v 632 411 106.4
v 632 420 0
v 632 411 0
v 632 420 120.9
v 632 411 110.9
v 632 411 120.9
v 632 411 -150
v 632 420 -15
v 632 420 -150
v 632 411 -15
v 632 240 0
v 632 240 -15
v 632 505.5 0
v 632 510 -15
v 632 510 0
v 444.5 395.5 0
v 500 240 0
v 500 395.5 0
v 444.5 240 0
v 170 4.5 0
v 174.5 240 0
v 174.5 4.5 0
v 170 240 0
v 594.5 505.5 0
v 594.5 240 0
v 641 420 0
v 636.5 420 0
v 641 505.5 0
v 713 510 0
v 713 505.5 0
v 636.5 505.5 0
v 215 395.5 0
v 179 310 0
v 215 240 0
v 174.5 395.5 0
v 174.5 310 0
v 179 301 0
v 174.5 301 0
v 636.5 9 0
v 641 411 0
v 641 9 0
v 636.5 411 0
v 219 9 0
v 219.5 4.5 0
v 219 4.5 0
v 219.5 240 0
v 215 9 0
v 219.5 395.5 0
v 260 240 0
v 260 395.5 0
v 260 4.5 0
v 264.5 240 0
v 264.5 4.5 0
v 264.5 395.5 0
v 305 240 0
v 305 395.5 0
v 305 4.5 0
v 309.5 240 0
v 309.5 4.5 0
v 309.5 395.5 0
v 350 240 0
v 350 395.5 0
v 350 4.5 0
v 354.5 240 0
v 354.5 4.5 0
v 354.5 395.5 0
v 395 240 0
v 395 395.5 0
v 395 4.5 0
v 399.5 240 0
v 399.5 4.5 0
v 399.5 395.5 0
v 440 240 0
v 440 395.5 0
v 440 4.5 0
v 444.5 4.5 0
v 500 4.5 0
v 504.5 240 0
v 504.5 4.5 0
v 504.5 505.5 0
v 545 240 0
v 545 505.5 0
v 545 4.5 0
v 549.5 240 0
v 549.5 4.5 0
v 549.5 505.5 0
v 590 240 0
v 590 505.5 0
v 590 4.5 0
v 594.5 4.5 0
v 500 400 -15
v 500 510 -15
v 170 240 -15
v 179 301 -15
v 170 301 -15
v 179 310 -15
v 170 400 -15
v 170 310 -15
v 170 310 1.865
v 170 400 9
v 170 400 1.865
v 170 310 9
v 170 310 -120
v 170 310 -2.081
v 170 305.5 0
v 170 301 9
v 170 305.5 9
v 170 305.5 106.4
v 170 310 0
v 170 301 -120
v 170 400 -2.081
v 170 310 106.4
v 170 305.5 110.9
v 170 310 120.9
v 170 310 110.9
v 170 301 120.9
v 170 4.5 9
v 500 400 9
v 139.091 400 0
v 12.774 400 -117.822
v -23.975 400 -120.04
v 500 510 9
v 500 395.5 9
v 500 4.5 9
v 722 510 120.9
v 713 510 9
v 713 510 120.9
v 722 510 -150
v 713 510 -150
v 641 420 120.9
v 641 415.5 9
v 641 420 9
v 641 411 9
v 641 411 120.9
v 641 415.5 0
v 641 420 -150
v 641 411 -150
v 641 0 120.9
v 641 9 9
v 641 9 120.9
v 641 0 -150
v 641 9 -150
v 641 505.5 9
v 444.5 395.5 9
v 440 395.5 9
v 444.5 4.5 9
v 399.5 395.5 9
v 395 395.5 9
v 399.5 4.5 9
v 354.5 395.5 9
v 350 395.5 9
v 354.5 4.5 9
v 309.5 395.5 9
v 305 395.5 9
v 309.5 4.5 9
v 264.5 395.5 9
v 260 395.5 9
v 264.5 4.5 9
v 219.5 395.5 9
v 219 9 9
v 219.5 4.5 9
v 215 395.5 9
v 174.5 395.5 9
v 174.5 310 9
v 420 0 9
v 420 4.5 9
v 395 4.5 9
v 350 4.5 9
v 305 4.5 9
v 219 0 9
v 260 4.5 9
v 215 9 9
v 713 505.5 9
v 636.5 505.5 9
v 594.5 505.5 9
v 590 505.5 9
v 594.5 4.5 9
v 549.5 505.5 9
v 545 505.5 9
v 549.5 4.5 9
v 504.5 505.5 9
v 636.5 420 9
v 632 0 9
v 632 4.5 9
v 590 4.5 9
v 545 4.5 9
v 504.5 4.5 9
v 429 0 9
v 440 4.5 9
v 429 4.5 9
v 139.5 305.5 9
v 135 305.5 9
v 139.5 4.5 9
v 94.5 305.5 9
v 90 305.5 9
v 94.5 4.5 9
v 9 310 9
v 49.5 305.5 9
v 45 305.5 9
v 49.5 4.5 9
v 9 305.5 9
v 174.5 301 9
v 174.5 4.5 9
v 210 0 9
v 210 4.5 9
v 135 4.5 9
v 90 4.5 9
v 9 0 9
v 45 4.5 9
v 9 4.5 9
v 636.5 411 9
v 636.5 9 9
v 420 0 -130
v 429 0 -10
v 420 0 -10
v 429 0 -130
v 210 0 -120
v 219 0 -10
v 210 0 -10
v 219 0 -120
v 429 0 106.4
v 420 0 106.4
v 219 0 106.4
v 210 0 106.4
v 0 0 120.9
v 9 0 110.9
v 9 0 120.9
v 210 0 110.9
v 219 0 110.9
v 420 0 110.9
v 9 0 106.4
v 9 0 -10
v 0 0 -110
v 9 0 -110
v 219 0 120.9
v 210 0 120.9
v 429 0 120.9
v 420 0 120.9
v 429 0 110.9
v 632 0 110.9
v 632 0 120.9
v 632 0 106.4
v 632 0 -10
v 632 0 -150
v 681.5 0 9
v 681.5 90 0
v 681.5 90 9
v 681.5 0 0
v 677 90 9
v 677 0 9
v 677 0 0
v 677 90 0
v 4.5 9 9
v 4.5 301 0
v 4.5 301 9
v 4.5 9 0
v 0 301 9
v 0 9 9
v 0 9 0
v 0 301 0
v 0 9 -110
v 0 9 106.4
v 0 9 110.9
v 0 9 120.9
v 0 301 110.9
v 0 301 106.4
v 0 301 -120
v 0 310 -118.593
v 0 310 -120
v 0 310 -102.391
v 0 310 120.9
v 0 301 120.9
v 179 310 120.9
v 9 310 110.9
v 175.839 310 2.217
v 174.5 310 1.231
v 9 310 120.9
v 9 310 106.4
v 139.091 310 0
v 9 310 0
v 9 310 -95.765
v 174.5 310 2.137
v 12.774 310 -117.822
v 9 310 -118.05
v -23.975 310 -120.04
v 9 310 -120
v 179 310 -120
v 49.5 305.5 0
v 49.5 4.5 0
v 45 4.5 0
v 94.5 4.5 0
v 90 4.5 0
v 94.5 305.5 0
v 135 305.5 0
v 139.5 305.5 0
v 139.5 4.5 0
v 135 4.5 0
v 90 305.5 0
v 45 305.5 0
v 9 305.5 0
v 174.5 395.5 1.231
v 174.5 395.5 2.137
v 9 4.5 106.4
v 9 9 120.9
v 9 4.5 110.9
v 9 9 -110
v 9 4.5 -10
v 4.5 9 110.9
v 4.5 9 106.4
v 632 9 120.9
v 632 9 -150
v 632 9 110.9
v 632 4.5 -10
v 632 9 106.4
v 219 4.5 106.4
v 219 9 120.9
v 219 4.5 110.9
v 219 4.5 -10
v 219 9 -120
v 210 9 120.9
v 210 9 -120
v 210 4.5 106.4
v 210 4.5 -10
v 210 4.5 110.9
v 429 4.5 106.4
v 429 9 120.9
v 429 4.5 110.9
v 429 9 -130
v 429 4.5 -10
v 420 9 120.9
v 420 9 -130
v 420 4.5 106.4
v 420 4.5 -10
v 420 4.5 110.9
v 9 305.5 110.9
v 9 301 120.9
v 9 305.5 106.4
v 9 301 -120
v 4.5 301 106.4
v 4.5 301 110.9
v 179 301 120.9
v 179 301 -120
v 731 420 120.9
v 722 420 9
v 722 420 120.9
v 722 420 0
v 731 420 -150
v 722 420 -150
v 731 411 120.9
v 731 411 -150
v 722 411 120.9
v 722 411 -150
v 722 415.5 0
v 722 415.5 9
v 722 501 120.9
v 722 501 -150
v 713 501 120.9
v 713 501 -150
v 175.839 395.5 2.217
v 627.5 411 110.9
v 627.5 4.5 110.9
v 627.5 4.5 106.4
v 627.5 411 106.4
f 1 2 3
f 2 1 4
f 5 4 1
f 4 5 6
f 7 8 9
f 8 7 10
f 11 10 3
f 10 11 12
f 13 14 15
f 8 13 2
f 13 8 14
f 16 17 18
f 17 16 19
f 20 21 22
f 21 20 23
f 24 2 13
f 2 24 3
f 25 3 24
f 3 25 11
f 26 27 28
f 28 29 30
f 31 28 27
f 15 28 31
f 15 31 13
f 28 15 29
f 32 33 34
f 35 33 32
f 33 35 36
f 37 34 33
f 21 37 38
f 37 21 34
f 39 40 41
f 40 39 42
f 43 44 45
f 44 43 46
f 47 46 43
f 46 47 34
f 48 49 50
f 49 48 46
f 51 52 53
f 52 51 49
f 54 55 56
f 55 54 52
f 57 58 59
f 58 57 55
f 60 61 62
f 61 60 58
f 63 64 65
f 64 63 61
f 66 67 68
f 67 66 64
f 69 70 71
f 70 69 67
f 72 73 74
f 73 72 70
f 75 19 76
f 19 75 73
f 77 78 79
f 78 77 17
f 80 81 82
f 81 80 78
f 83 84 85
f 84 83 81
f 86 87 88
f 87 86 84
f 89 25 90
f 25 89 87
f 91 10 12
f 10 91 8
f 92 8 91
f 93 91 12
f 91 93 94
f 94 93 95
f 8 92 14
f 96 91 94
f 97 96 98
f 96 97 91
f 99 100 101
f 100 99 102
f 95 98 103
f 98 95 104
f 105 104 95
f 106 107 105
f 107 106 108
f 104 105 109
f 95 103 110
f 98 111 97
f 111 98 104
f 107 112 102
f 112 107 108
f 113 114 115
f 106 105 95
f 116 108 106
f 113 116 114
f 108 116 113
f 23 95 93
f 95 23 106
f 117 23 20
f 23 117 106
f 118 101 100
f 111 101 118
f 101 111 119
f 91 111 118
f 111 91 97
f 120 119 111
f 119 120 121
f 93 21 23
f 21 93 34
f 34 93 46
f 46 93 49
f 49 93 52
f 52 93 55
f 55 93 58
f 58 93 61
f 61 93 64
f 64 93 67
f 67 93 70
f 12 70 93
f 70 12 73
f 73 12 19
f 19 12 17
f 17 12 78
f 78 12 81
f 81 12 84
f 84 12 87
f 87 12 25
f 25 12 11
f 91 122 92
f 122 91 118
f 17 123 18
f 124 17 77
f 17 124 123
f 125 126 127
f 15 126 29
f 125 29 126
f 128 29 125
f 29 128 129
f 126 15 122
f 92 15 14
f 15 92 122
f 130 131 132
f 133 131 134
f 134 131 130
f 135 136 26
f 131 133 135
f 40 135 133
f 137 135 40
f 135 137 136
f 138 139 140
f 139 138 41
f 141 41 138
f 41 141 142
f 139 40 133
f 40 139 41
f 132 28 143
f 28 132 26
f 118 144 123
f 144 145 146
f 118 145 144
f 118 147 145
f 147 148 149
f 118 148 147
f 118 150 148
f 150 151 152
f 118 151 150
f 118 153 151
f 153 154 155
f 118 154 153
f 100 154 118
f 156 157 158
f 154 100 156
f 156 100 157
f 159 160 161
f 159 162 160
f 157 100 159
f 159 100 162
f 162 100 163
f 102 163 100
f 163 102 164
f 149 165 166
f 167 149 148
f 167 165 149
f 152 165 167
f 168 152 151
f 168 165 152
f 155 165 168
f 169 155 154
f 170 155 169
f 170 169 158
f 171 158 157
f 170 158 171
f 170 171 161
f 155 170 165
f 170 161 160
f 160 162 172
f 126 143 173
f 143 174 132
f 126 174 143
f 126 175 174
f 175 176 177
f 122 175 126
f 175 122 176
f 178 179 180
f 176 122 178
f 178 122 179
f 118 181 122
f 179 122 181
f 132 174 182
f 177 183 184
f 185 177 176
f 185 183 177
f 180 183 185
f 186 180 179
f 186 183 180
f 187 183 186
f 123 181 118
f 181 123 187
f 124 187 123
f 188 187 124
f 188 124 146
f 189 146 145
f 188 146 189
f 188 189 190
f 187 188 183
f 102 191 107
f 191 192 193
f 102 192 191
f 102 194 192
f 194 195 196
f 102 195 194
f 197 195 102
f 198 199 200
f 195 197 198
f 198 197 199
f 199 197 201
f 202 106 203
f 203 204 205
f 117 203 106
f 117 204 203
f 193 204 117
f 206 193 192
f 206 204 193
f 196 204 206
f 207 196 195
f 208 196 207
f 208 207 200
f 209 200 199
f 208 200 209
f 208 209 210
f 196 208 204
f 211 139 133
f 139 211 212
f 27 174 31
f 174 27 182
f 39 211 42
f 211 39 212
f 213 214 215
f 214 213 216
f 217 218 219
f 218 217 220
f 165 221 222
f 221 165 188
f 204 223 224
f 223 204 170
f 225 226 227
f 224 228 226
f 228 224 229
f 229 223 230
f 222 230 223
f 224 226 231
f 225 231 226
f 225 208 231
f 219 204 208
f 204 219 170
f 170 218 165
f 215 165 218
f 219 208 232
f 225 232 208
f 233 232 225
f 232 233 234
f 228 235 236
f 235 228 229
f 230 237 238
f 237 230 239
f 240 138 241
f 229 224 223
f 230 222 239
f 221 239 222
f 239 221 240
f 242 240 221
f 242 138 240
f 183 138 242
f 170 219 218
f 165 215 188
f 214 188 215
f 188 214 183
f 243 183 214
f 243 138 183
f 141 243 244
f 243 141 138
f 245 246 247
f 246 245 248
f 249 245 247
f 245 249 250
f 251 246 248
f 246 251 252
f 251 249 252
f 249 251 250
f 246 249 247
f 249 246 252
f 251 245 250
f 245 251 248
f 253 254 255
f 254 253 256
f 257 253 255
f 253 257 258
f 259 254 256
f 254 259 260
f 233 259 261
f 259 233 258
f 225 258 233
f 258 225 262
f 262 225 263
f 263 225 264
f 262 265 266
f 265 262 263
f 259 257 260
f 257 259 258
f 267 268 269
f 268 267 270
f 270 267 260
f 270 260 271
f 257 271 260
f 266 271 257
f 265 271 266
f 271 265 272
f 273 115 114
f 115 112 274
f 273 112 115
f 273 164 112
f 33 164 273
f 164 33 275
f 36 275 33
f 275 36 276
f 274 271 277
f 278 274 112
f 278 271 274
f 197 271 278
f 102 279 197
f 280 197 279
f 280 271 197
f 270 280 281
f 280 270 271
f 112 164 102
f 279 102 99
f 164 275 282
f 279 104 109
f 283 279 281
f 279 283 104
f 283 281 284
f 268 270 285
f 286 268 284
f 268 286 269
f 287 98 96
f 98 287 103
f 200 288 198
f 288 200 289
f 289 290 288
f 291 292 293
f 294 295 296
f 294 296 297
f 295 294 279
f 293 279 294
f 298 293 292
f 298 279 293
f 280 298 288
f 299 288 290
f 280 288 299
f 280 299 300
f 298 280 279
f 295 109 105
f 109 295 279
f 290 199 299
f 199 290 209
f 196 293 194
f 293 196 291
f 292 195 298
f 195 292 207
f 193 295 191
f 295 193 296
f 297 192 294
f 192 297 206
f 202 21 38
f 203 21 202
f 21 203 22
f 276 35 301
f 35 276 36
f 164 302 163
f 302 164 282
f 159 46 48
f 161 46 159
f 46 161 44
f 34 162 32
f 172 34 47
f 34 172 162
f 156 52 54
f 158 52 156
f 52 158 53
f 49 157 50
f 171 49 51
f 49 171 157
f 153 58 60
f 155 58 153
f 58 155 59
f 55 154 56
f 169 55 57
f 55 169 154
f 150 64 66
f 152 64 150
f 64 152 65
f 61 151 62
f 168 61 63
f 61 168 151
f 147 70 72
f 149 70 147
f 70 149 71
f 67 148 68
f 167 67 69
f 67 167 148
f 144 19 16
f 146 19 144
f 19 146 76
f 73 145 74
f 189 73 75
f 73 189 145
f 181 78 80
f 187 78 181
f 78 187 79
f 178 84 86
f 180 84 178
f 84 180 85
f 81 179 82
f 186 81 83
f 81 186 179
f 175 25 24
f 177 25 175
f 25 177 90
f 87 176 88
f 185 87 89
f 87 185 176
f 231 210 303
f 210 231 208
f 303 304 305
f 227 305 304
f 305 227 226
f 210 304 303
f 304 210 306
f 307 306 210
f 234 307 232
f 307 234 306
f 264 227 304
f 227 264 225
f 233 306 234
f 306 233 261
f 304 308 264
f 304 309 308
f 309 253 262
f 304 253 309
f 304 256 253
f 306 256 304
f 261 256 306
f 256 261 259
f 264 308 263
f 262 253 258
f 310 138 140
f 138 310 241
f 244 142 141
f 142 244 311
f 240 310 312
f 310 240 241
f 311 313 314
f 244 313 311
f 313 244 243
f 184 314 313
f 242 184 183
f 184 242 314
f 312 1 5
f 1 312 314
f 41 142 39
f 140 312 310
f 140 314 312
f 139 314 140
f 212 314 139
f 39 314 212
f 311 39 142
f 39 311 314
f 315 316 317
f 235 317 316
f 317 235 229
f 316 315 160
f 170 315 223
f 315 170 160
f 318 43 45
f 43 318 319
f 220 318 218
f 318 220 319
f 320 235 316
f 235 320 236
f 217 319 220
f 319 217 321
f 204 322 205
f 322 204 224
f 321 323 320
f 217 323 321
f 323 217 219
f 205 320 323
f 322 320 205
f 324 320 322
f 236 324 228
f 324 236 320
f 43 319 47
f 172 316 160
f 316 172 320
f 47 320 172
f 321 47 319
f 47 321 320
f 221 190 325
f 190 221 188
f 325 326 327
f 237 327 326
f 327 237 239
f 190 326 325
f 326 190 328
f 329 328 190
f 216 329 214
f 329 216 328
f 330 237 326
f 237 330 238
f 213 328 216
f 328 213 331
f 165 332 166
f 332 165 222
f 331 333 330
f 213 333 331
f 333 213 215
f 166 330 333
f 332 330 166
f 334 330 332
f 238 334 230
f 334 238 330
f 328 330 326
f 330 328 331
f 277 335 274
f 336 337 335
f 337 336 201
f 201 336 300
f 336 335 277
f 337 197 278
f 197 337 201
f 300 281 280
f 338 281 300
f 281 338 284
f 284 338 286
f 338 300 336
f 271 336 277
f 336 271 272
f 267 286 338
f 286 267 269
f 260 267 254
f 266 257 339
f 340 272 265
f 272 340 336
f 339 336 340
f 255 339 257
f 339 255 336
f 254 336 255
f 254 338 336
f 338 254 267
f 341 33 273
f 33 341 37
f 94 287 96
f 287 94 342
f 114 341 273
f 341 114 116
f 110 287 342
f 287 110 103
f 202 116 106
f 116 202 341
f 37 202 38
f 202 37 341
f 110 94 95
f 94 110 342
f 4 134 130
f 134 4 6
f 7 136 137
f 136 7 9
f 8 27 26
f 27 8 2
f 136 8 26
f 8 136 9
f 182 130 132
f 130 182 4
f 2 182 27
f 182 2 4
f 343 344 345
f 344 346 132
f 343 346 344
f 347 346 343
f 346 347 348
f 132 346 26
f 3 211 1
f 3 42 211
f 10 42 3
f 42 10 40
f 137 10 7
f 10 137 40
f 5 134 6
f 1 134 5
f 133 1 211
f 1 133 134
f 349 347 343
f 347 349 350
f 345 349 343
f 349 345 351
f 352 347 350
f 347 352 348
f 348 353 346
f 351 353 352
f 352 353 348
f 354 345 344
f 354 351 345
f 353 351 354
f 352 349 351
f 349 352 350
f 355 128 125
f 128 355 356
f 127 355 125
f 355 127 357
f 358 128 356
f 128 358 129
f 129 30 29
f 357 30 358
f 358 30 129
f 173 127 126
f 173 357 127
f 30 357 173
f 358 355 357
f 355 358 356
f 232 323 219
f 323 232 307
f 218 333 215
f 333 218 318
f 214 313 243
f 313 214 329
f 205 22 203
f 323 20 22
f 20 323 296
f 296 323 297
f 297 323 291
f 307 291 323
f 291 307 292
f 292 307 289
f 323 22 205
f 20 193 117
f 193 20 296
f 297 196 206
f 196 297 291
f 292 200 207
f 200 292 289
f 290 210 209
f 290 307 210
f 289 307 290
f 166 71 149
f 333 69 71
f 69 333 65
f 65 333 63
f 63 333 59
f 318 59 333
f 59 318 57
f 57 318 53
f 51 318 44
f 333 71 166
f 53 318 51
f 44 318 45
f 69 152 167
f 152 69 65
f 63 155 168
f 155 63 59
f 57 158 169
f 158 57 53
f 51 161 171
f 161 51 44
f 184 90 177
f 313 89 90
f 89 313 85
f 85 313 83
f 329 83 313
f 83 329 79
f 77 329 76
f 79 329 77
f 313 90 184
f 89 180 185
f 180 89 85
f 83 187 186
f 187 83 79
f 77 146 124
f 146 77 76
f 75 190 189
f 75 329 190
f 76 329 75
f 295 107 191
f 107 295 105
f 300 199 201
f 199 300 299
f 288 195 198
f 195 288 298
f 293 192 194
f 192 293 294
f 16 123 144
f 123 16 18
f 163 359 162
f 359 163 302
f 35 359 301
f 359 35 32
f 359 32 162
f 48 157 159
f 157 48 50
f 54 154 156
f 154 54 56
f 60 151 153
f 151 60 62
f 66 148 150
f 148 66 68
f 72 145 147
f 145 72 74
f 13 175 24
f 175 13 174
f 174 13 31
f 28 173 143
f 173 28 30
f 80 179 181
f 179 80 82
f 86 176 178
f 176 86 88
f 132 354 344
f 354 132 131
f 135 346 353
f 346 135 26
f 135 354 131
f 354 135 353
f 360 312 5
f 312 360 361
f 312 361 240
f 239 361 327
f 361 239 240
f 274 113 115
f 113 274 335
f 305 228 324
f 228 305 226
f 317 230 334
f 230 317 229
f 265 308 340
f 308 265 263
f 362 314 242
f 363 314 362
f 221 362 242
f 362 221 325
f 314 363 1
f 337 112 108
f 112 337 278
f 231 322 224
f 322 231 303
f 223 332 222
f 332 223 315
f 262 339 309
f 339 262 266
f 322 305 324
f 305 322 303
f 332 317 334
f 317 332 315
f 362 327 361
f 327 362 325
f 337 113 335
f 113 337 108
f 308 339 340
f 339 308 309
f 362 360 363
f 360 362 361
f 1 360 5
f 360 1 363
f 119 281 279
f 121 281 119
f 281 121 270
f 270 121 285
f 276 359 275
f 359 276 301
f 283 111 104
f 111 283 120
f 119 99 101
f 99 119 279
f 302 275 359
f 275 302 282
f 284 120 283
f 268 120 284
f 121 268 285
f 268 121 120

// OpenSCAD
union () {
  color ([4/5, 4/5, 4/5, 1]) {
    union () {
      translate ([170, 240, -15]) {
        cube ([462, 160, 15]);
      }
      translate ([500, 400, -15]) {
        cube ([132, 110, 15]);
      }
    }
  }
  color ([3/5, 113/255, 29/85, 1]) {
    translate ([0, 0, -110]) {
      cube ([9, 9, 230.9]);
    }
  }
  color ([3/5, 113/255, 29/85, 1]) {
    translate ([632, 0, -150]) {
      cube ([9, 9, 270.9]);
    }
  }
  color ([3/5, 113/255, 29/85, 1]) {
    translate ([210, 0, -120]) {
      cube ([9, 9, 240.9]);
    }
  }
  color ([3/5, 113/255, 29/85, 1]) {
    translate ([420, 0, -130]) {
      cube ([9, 9, 250.9]);
    }
  }
  color ([3/5, 113/255, 29/85, 1]) {
    translate ([0, 301, -120]) {
      cube ([9, 9, 240.9]);
    }
  }
  color ([3/5, 113/255, 29/85, 1]) {
    translate ([170, 301, -120]) {
      cube ([9, 9, 240.9]);
    }
  }
  color ([3/5, 113/255, 29/85, 1]) {
    translate ([632, 411, -150]) {
      cube ([9, 9, 270.9]);
    }
  }
  color ([3/5, 113/255, 29/85, 1]) {
    translate ([722, 411, -150]) {
      cube ([9, 9, 270.9]);
    }
  }
  color ([3/5, 113/255, 29/85, 1]) {
    translate ([713, 501, -150]) {
      cube ([9, 9, 270.9]);
    }
  }
  color ([3/5, 113/255, 29/85, 1]) {
    translate ([0, 0, -10]) {
      cube ([641, 4.5, 19]);
    }
  }
  color ([3/5, 113/255, 29/85, 1]) {
    translate ([0, 305.5, 0]) {
      cube ([170, 4.5, 9]);
    }
  }
  color ([3/5, 113/255, 29/85, 1]) {
    translate ([170, 395.5, 0]) {
      cube ([330, 4.5, 9]);
    }
  }
  color ([3/5, 113/255, 29/85, 1]) {
    translate ([500, 505.5, 0]) {
      cube ([222, 4.5, 9]);
    }
  }
  color ([3/5, 113/255, 29/85, 1]) {
    translate ([632, 415.5, 0]) {
      cube ([90, 4.5, 9]);
    }
  }
  color ([3/5, 113/255, 29/85, 1]) {
    translate ([0, 0, 106.4]) {
      cube ([632, 4.5, 4.5]);
    }
  }
  color ([3/5, 113/255, 29/85, 1]) {
    translate ([0, 305.5, 106.4]) {
      cube ([170, 4.5, 4.5]);
    }
  }
  color ([3/5, 113/255, 29/85, 1]) {
    translate ([0, 0, 106.4]) {
      cube ([4.5, 310, 4.5]);
    }
  }
  color ([3/5, 113/255, 29/85, 1]) {
    translate ([627.5, 0, 106.4]) {
      cube ([4.5, 411, 4.5]);
    }
  }
  translate ([139.0909090909091, 310, 0]) {
    rotate ([0.0,4463.641621428631,0.0]) {
      polyhedron (points=[[0, 0, 0], [202.48456731316588, 0, 0], [202.48456731316588, 90, 0], [0, 90, 0], [-30.909090909090907, 0, 20], [171.57547640407498, 0, 20], [171.57547640407498, 90, 20], [-30.909090909090907, 90, 20]], faces=[[0, 1, 2, 3], [4, 5, 1, 0], [7, 6, 5, 4], [5, 6, 2, 1], [6, 7, 3, 2], [7, 4, 0, 3]]);
    }
  }
  union () {
    color ([3/5, 113/255, 29/85, 1]) {
      translate ([636.5, 0, 0]) {
        cube ([4.5, 510, 9]);
      }
    }
    color ([3/5, 113/255, 29/85, 1]) {
      translate ([677, 0, 0]) {
        cube ([4.5, 90, 9]);
      }
    }
    color ([3/5, 113/255, 29/85, 1]) {
      translate ([0, 0, 0]) {
        cube ([4.5, 310, 9]);
      }
    }
    color ([3/5, 113/255, 29/85, 1]) {
      translate ([45, 0, 0]) {
        cube ([4.5, 310, 9]);
      }
    }
    color ([3/5, 113/255, 29/85, 1]) {
      translate ([90, 0, 0]) {
        cube ([4.5, 310, 9]);
      }
    }
    color ([3/5, 113/255, 29/85, 1]) {
      translate ([135, 0, 0]) {
        cube ([4.5, 310, 9]);
      }
    }
    color ([3/5, 113/255, 29/85, 1]) {
      translate ([170, 0, 0]) {
        cube ([4.5, 400, 9]);
      }
    }
    color ([3/5, 113/255, 29/85, 1]) {
      translate ([215, 0, 0]) {
        cube ([4.5, 400, 9]);
      }
    }
    color ([3/5, 113/255, 29/85, 1]) {
      translate ([260, 0, 0]) {
        cube ([4.5, 400, 9]);
      }
    }
    color ([3/5, 113/255, 29/85, 1]) {
      translate ([305, 0, 0]) {
        cube ([4.5, 400, 9]);
      }
    }
    color ([3/5, 113/255, 29/85, 1]) {
      translate ([350, 0, 0]) {
        cube ([4.5, 400, 9]);
      }
    }
    color ([3/5, 113/255, 29/85, 1]) {
      translate ([395, 0, 0]) {
        cube ([4.5, 400, 9]);
      }
    }
    color ([3/5, 113/255, 29/85, 1]) {
      translate ([440, 0, 0]) {
        cube ([4.5, 400, 9]);
      }
    }
    color ([3/5, 113/255, 29/85, 1]) {
      translate ([500, 0, 0]) {
        cube ([4.5, 510, 9]);
      }
    }
    color ([3/5, 113/255, 29/85, 1]) {
      translate ([545, 0, 0]) {
        cube ([4.5, 510, 9]);
      }
    }
    color ([3/5, 113/255, 29/85, 1]) {
      translate ([590, 0, 0]) {
        cube ([4.5, 510, 9]);
      }
    }
  }
}
